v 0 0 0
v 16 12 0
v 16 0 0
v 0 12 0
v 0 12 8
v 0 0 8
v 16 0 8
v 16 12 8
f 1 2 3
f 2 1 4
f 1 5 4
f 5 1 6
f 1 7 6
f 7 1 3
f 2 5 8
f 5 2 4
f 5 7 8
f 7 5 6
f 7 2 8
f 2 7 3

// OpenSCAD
module cube11b(L=4)
{

COR1=0.0;
translate([0,  0,0]) color([0.4,COR1,COR1]) cube(L);
translate([0,  L,0]) color([COR1,0.4,COR1]) cube(L);
translate([0,2*L,0]) color([COR1,COR1,0.4]) cube(L);
translate([0,  0,L]) color([0.8,COR1,COR1]) cube(L);
translate([0,  L,L]) color([COR1,0.8,COR1]) cube(L);
translate([0,2*L,L]) color([COR1,COR1,0.8]) cube(L);

COR2=0.25;
translate([L,  0,0]) color([0.4,COR2,COR2]) cube(L);
translate([L,  L,0]) color([COR2,0.4,COR2]) cube(L);
translate([L,2*L,0]) color([COR2,COR2,0.4]) cube(L);
translate([L,  0,L]) color([0.8,COR2,COR2]) cube(L);
translate([L,  L,L]) color([COR2,0.8,COR2]) cube(L);
translate([L,2*L,L]) color([COR2,COR2,0.8]) cube(L);

COR3=0.5;
translate([2*L,  0,0]) color([0.4,COR3,COR3]) cube(L);
translate([2*L,  L,0]) color([COR3,0.4,COR3]) cube(L);
translate([2*L,2*L,0]) color([COR3,COR3,0.4]) cube(L);
translate([2*L,  0,L]) color([0.8,COR3,COR3]) cube(L);
translate([2*L,  L,L]) color([COR3,0.8,COR3]) cube(L);
translate([2*L,2*L,L]) color([COR3,COR3,0.8]) cube(L);


COR4=0.75;
translate([3*L,  0,0]) color([0.4,COR4,COR4]) cube(L);
translate([3*L,  L,0]) color([COR4,0.4,COR4]) cube(L);
translate([3*L,2*L,0]) color([COR4,COR4,0.4]) cube(L);
translate([3*L,  0,L]) color([0.8,COR4,COR4]) cube(L);
translate([3*L,  L,L]) color([COR4,0.8,COR4]) cube(L);
translate([3*L,2*L,L]) color([COR4,COR4,0.8]) cube(L);
}
cube11b(L=4);
